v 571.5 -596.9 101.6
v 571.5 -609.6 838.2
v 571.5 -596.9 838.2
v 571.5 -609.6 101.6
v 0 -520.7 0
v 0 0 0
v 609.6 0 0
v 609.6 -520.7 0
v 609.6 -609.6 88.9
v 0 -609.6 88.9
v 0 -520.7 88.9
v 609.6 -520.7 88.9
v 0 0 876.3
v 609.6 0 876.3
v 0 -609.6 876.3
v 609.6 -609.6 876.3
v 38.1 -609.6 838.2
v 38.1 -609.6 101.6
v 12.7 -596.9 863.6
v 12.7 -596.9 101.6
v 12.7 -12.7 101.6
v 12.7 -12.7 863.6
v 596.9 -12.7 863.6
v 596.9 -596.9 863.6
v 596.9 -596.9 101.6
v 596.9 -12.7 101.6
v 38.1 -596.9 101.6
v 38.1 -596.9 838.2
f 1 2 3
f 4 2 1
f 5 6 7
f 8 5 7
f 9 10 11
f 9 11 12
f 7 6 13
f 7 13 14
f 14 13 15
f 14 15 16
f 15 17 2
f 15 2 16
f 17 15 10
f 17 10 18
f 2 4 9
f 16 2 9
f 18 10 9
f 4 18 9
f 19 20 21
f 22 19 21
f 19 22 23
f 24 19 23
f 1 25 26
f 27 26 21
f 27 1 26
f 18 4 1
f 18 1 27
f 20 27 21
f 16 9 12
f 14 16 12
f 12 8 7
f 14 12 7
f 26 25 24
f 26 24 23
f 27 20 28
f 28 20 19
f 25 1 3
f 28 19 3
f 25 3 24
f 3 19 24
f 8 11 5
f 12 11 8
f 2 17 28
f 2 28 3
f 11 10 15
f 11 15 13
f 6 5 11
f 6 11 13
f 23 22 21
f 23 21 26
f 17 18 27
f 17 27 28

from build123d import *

# Parameters (mm, degrees)
F0_W     = 609.6
F0_H     = 609.6
F1_DEPTH = 876.3
F2_W     = 609.6
F2_H     = 88.9
F3_DEPTH = 88.9
F4_T     = -12.7
F5_DEPTH = 88.9
F6_W     = 609.6
F6_H     = 787.4
F7_DEPTH = 12.7


with BuildPart() as f1:
    # F0 (on Top) → F1 (new body)
    with BuildSketch(Plane.XY):
        with Locations((304.8, -304.8)):
            Rectangle(F0_W, F0_H)
    extrude(amount=F1_DEPTH)

    # F2 (on face) → F3 (cut)
    with BuildSketch(Plane.XZ.offset(609.6)):
        with Locations((304.8, 44.45)):
            Rectangle(F2_W, F2_H)
    extrude(amount=-F3_DEPTH, mode=Mode.SUBTRACT)

    # F4
    f4_openings = [f1.faces().sort_by_distance(p)[0] for p in [
        (304.8, -609.6, 482.6),
    ]]
    offset(amount=F4_T, openings=f4_openings, kind=Kind.INTERSECTION)

    # F5 (add, through all): a face of the model
    f5_faces = [f1.faces().sort_by_distance(p)[0] for p in [
        (304.8, -260.35, 12.7),
    ]]
    extrude(f5_faces, amount=F5_DEPTH)

    # F6 (on face) → F7 (join)
    with BuildSketch(Plane.XZ.offset(609.6)):
        with Locations((304.8, 482.6)):
            Rectangle(F6_W, F6_H)
        Polygon((571.5, 101.6), (38.1, 101.6), (12.7, 101.6), (12.7, 863.6), (596.9, 863.6), (596.9, 101.6), align=None, mode=Mode.SUBTRACT)
        Polygon((38.1, 101.6), (38.1, 838.2), (571.5, 838.2), (571.5, 101.6), (596.9, 101.6), (596.9, 863.6), (12.7, 863.6), (12.7, 101.6), align=None)
    extrude(amount=-F7_DEPTH)


solid = f1.part
